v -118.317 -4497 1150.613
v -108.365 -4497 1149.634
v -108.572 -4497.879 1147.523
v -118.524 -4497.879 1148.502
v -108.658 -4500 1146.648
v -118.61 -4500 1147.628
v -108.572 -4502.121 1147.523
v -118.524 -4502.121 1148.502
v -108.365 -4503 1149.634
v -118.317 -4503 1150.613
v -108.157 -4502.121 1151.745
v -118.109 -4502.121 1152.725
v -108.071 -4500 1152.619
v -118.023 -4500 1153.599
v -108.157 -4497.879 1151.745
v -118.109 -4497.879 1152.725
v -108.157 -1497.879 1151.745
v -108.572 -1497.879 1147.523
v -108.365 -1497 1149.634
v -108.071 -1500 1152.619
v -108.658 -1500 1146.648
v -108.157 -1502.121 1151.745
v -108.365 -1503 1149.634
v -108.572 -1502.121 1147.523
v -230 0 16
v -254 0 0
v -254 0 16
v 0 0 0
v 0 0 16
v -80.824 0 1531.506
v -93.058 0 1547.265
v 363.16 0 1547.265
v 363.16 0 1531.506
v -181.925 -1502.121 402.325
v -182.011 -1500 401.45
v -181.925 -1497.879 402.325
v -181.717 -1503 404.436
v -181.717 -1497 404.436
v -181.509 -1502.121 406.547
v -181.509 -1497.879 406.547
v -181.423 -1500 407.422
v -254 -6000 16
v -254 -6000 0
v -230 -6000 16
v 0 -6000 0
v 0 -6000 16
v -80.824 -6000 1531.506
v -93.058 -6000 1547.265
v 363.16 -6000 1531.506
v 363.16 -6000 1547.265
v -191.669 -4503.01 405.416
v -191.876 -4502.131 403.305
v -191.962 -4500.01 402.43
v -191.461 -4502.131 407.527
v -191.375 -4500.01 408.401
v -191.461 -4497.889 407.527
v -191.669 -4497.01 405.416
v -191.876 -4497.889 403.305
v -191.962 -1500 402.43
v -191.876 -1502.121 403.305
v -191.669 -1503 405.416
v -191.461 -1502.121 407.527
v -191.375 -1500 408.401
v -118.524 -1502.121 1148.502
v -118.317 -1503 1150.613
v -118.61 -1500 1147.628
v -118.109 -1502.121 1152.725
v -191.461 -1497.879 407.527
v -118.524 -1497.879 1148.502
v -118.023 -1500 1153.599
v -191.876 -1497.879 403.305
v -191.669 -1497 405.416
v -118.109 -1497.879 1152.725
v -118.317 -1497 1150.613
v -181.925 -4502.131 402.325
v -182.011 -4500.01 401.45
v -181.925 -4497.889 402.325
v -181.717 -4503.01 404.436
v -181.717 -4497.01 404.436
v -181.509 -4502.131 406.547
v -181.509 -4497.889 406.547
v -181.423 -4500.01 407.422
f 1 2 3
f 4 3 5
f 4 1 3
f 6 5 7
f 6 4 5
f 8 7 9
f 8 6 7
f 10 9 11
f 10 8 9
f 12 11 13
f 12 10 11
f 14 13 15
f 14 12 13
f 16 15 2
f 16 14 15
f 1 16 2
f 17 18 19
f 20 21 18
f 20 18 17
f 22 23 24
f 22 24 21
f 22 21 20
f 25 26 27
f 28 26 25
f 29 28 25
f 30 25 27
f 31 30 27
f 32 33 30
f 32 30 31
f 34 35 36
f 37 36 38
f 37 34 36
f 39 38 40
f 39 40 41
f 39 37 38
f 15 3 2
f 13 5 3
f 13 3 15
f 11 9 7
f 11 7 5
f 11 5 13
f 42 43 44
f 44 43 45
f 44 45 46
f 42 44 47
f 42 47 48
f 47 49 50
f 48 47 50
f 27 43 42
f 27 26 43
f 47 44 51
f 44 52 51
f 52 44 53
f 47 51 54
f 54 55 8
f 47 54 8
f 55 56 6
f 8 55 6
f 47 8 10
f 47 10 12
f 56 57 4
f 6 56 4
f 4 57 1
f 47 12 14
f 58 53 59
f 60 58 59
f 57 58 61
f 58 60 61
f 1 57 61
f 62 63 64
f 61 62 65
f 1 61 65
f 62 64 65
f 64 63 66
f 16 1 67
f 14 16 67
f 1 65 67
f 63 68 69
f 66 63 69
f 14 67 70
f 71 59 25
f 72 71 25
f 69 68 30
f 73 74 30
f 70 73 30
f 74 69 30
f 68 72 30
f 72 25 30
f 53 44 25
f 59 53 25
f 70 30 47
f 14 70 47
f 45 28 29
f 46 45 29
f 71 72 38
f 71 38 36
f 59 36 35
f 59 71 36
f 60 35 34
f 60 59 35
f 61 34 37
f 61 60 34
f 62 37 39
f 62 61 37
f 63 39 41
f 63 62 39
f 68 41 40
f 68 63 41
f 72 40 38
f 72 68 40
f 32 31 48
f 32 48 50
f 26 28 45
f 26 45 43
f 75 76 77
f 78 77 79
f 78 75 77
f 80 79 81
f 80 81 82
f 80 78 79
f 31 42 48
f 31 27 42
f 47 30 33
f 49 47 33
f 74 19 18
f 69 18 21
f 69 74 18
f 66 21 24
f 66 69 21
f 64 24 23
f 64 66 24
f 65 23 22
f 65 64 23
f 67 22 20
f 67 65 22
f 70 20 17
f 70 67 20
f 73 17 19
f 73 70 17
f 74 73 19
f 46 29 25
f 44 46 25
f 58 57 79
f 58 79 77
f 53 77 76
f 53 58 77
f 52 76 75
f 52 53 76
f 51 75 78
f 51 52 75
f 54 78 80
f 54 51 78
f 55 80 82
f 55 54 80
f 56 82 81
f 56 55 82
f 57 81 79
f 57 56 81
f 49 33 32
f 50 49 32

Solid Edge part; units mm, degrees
sketch "Sketch1" plane through (0, 0, 0) normal (0, -1, 0) x (1, 0, 0)
  line L0 (-254, 16) -> (-93.0575, 1547.2654)
  line L1 (-93.0575, 1547.2654) -> (363.1602, 1547.2654)
  line L2 (363.1602, 1531.5058) -> (363.1602, 1547.2654)
  line L3 (-80.8241, 1531.5058) -> (363.1602, 1531.5058)
  line L4 (-230, 16) -> (-80.8241, 1531.5058)
  line L5 (0, 16) -> (-230, 16)
  line L6 (0, 0) -> (0, 16)
  line L7 (0, 0) -> (-254, 0)
  line L8 (-254, 0) -> (-254, 16)
extrude "Protrusion1" add sketch "Sketch1" along normal blind 6000
sketch "Sketch2" plane through (-155.5443, -3000, 772.409) normal (0.9952, 0, -0.098) x (0, 1, 0)
  circle A0 centre (-1500, 380.0323) radius 3
extrude "ProtrusiónExtruida_7" add sketch "Sketch2" along normal blind 10
sketch "Sketch3" plane through (-155.5443, -3000, 772.409) normal (0.9952, 0, -0.098) x (0, 1, 0)
  circle A0 centre (-1500.0101, -368.767) radius 3
extrude "ProtrusiónExtruida_8" add sketch "Sketch3" along normal blind 10
sketch "Sketch4" plane through (-155.5443, -3000, 772.409) normal (0.9952, 0, -0.098) x (0, 1, 0)
  circle A0 centre (1500, -368.767) radius 3
extrude "ProtrusiónExtruida_9" add sketch "Sketch4" along normal blind 10
sketch "Sketch5" plane through (-155.5443, -3000, 772.409) normal (0.9952, 0, -0.098) x (0, 1, 0)
  circle A0 centre (1500, 380.0323) radius 3
extrude "ProtrusiónExtruida_10" add sketch "Sketch5" along normal blind 10
